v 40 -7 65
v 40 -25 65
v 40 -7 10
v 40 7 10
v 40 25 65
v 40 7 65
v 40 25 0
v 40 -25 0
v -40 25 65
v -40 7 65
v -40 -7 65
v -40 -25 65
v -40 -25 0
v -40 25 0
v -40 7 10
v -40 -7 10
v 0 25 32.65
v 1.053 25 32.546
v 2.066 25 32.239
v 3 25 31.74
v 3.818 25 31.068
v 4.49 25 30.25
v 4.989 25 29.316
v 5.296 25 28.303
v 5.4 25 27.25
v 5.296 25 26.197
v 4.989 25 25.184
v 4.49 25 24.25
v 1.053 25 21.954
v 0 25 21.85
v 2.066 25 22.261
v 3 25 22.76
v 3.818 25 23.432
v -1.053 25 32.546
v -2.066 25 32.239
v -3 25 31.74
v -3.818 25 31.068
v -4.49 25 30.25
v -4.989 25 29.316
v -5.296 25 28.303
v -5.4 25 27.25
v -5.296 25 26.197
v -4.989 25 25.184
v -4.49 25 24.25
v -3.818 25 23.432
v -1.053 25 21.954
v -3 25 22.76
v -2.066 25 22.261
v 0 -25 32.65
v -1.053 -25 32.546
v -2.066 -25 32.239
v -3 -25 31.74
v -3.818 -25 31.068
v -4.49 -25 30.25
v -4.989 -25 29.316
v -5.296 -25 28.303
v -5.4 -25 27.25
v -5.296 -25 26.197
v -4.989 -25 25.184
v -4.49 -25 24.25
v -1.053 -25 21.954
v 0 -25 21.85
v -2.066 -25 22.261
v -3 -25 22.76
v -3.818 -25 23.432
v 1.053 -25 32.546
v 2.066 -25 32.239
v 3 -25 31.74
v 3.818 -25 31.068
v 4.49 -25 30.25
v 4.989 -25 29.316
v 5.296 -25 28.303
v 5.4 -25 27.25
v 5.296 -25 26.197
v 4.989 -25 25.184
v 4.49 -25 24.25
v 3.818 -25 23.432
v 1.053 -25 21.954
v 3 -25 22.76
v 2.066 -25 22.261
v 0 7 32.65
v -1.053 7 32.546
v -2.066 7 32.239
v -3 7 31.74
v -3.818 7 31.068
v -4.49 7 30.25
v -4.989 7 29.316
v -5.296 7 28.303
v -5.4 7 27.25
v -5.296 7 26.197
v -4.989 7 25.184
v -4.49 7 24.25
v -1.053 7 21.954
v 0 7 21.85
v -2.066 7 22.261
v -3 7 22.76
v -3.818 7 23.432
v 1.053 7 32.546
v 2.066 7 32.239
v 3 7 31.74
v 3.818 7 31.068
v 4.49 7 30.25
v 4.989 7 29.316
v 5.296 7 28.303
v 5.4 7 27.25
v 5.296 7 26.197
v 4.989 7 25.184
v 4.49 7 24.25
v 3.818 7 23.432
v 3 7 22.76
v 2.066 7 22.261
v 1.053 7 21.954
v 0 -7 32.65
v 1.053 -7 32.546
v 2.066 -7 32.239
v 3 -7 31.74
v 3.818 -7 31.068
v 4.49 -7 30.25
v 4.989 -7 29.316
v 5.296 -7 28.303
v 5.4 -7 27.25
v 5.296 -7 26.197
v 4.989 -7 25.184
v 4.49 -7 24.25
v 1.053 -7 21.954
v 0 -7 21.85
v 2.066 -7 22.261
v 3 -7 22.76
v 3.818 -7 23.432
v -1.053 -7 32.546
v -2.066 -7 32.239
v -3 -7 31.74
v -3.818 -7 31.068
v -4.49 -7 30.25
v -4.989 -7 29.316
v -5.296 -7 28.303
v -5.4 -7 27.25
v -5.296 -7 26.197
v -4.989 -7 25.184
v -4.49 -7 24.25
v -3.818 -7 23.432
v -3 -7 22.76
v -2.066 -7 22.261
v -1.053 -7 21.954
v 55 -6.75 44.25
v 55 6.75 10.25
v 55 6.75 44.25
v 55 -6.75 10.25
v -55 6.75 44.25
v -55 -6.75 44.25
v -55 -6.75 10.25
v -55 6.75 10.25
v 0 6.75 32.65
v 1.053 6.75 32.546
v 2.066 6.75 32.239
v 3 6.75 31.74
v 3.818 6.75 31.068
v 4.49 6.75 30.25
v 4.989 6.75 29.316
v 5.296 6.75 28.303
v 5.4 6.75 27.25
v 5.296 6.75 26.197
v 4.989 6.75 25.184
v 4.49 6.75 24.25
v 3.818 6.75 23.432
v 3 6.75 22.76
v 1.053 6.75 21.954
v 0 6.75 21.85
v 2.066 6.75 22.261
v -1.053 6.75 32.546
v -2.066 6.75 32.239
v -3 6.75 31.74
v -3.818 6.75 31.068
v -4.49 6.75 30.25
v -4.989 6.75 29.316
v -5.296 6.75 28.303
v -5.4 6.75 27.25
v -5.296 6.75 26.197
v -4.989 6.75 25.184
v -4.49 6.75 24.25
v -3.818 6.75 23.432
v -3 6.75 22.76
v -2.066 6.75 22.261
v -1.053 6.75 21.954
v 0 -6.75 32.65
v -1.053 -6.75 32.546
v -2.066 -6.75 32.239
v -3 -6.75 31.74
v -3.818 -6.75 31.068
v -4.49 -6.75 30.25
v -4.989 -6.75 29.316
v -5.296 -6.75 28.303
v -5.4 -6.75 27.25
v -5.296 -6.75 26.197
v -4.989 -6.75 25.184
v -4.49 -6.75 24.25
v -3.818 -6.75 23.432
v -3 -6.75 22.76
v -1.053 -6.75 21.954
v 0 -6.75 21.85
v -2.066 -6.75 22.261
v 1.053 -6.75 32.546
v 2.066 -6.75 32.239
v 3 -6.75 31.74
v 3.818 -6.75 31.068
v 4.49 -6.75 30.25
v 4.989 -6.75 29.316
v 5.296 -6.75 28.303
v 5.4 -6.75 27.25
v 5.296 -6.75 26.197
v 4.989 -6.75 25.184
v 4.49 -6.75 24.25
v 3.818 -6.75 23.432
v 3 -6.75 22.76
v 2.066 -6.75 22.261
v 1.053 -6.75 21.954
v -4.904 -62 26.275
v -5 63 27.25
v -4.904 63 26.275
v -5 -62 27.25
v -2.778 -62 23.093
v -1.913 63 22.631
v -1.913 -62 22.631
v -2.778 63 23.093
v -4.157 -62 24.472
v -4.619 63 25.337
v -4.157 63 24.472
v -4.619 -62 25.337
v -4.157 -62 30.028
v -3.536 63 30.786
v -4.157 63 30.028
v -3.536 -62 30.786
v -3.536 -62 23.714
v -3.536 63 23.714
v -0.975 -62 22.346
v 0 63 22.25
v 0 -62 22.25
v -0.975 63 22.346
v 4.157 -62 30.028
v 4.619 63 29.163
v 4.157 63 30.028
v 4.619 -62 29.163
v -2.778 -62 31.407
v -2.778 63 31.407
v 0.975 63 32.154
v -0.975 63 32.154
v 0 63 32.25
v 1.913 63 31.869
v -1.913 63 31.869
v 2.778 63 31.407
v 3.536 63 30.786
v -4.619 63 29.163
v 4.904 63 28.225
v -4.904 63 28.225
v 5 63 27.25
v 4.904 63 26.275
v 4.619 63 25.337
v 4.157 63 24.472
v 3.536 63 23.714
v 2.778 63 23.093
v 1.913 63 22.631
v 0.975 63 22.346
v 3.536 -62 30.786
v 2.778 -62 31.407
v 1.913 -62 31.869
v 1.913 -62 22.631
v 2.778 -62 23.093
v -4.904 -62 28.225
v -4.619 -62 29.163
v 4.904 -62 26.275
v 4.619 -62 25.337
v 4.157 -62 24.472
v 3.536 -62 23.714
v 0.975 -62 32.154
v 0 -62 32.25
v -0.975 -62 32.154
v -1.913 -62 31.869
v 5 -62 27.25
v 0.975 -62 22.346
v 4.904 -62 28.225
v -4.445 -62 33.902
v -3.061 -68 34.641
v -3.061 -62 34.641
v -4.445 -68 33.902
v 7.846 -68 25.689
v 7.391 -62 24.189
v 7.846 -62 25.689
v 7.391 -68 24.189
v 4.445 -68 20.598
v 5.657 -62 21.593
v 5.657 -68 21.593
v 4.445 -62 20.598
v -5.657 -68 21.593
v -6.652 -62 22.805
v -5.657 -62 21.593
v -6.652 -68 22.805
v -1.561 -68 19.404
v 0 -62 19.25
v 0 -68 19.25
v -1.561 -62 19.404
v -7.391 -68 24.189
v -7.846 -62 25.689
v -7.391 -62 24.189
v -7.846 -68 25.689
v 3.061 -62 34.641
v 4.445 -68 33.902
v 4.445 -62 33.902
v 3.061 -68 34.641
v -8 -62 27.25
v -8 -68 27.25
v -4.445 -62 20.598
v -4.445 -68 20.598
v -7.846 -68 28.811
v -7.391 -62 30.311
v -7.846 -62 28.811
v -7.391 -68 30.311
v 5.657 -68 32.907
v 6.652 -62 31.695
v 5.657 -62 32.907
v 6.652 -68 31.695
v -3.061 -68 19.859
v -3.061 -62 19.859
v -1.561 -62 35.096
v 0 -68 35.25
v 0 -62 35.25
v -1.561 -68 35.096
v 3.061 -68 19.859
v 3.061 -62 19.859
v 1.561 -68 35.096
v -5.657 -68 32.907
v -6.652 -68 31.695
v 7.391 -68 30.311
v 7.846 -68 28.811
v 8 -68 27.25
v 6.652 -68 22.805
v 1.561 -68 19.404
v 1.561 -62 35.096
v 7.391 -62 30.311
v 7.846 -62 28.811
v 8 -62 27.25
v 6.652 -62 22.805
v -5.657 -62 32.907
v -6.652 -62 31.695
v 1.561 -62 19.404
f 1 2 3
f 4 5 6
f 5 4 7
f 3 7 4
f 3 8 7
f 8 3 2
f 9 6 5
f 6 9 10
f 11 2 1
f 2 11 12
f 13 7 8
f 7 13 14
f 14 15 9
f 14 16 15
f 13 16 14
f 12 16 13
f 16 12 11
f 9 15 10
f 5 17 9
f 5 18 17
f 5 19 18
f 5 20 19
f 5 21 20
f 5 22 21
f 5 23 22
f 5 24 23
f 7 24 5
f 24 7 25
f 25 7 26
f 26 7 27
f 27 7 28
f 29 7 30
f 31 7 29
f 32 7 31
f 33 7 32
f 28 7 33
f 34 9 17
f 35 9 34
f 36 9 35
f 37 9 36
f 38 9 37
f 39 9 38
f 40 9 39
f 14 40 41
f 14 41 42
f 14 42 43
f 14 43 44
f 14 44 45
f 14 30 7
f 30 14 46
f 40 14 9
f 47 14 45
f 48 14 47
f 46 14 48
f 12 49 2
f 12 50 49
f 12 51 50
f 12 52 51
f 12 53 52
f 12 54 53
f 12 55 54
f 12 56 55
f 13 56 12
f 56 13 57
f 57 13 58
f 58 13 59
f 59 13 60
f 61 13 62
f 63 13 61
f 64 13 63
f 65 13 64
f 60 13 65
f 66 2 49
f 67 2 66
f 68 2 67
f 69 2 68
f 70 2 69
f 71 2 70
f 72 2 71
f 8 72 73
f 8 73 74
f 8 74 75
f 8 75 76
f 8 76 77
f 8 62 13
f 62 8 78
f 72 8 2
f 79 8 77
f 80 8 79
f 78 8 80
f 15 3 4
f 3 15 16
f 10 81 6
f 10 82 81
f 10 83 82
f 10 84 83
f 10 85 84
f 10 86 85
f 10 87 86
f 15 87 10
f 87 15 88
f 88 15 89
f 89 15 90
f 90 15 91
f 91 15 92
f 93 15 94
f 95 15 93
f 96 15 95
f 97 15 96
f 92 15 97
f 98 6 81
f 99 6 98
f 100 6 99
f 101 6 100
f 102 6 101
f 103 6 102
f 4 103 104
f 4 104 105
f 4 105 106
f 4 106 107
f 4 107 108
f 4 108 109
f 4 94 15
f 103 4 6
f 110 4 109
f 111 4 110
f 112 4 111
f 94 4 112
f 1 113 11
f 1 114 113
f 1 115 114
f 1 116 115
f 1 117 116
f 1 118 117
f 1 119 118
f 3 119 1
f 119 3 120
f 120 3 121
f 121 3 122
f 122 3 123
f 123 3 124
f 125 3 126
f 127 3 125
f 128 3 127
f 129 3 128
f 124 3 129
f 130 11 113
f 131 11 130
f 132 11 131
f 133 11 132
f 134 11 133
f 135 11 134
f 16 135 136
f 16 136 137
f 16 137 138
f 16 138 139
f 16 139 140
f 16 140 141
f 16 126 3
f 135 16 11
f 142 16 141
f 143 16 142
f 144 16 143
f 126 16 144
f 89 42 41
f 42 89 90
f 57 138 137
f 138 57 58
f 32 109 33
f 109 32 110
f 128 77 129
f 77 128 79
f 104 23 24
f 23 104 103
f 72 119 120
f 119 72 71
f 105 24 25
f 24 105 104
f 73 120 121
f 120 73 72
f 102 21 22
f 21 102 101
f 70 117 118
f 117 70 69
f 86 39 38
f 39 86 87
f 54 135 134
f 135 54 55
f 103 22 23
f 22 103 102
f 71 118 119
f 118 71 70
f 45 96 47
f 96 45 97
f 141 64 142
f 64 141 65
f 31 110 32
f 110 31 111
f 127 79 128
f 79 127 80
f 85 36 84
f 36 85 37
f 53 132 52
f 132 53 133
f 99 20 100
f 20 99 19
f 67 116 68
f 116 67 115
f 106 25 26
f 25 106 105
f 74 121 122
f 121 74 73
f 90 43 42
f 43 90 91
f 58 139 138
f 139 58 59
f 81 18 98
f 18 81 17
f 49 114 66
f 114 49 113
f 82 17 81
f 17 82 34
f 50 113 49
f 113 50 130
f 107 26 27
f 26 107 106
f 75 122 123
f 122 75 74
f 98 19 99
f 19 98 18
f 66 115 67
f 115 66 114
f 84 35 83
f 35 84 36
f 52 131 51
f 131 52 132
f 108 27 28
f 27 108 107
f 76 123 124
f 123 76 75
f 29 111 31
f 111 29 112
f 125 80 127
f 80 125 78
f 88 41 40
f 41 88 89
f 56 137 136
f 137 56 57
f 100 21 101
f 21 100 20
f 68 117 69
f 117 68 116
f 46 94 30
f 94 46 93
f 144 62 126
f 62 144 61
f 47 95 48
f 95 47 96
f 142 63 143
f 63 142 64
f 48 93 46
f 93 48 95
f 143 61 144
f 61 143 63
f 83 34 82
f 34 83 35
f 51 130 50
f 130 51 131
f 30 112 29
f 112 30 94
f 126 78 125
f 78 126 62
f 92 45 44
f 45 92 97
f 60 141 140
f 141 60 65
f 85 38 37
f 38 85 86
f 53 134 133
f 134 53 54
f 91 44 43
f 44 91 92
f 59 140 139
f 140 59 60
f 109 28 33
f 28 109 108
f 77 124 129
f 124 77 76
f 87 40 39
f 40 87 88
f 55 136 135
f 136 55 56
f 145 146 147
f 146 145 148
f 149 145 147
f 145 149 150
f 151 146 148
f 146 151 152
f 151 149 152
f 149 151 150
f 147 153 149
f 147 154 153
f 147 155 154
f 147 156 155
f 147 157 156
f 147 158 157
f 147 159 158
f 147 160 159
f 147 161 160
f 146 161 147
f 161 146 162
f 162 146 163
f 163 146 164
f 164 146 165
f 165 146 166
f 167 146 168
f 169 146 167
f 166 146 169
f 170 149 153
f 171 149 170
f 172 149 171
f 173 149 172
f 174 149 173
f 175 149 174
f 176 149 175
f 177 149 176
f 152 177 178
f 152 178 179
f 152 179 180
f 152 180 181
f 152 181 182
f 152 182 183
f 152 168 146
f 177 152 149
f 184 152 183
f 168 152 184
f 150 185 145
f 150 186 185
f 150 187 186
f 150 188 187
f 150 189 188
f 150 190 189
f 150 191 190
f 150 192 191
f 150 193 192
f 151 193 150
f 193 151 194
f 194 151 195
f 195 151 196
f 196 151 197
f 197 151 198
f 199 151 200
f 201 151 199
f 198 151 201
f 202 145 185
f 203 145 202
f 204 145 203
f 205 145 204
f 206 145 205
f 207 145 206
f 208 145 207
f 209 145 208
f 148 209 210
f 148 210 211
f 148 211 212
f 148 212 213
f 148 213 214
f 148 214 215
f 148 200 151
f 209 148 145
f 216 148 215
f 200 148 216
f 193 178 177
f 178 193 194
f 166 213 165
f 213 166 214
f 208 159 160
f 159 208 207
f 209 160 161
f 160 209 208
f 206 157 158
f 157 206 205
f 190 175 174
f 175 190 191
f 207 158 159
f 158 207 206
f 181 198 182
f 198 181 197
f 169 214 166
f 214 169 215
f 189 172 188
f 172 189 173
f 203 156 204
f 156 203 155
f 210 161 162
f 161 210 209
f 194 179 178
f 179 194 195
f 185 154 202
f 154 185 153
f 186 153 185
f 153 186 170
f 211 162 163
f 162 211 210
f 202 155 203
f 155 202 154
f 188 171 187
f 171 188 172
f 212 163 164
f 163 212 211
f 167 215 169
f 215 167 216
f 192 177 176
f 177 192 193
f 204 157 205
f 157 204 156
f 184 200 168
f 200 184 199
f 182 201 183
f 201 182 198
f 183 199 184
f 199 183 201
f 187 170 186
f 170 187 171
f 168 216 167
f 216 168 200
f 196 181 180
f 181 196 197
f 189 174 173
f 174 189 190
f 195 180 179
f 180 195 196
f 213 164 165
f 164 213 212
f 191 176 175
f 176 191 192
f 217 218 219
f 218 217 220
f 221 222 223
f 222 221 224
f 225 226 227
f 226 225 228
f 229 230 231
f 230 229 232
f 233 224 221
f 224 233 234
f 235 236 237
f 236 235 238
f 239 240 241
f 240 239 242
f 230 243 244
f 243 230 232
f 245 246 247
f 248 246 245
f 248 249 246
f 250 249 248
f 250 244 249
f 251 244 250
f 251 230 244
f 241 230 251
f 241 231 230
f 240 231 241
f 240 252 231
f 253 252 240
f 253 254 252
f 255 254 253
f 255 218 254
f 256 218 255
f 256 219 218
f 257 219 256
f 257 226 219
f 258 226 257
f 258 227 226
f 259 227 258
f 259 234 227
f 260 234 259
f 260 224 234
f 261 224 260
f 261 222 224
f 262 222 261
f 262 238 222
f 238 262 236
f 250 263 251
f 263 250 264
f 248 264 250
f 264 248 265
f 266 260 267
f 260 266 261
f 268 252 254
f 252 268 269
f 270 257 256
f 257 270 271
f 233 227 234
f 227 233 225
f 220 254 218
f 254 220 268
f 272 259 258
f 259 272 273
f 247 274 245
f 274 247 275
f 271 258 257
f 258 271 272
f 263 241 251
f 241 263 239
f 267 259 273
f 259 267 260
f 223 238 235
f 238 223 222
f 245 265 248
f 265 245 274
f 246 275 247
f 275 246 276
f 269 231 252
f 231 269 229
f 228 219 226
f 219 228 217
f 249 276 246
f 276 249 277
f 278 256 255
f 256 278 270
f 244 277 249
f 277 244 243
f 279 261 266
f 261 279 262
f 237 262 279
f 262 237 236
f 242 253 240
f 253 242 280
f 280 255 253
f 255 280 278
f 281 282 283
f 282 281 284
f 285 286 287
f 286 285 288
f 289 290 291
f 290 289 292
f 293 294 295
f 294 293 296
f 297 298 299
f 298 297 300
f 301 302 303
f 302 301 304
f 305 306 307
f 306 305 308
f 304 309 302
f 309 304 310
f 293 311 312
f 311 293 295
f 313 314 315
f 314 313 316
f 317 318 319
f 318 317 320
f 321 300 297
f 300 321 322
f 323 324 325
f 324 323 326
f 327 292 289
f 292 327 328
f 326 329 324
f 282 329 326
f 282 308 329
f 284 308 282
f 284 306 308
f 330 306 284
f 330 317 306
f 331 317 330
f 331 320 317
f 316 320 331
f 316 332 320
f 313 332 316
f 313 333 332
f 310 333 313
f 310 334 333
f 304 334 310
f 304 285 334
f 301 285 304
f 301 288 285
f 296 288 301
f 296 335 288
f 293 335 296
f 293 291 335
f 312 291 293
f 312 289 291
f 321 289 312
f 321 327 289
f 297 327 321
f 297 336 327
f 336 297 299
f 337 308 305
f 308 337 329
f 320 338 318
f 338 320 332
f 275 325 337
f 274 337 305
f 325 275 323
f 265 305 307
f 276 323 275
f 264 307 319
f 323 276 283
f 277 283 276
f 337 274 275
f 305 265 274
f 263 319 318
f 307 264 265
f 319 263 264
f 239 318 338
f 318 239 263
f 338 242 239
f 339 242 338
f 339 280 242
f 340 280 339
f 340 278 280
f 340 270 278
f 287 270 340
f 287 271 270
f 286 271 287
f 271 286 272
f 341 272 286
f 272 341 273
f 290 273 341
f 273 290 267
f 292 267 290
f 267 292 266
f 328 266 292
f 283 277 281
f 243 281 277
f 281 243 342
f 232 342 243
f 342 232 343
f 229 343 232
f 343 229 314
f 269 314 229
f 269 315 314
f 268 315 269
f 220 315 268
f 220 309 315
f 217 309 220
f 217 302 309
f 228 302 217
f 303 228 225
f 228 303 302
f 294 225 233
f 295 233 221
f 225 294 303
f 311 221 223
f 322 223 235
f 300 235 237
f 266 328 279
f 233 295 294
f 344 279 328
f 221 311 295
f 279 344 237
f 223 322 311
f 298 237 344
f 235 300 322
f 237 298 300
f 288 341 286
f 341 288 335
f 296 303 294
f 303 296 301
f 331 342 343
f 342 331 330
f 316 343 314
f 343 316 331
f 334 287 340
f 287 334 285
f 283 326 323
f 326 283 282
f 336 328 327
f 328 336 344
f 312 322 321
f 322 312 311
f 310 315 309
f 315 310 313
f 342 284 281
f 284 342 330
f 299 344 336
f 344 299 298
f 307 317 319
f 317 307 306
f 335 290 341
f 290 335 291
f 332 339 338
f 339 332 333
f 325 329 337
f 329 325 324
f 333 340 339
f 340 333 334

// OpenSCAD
$fn = 32;

// ------------------------------------------------------------------------
// Clevis joint: 80 mm clevis, pin d10
// Every part is its own module, assembly() places them once.
// ------------------------------------------------------------------------

// --- part 1 ---
module clevis() {
  difference() {
    translate([-40, -25, 0]) cube([80, 50, 65]);
    translate([-41, -7, 10]) cube([82, 14, 56]);
    translate([0, 0, 27.25]) rotate([90, 0, 0]) cylinder(h = 52, d = 10.8, center = true);
  }
}

// --- part 2 ---
module eye() {
  difference() {
    translate([-55, -6.75, 0]) cube([110, 13.5, 34]);
    translate([0, 0, 17]) rotate([90, 0, 0]) cylinder(h = 15.5, d = 10.8, center = true);
  }
}

// --- part 3 ---
module pin() {
  rotate([0, 90, 0]) cylinder(h = 126, d = 10, center = true);
  translate([-68, 0, 0]) rotate([0, 90, 0]) cylinder(h = 6, d = 16);
}

// --- assembly ---
module assembly() {
  translate([0, 0, 0]) rotate([0, 0, 0]) clevis();
  translate([0, 0, 10.25]) rotate([0, 0, 0]) eye();
  translate([0, 0, 27.25]) rotate([0, 0, 90]) pin();
}

assembly();
